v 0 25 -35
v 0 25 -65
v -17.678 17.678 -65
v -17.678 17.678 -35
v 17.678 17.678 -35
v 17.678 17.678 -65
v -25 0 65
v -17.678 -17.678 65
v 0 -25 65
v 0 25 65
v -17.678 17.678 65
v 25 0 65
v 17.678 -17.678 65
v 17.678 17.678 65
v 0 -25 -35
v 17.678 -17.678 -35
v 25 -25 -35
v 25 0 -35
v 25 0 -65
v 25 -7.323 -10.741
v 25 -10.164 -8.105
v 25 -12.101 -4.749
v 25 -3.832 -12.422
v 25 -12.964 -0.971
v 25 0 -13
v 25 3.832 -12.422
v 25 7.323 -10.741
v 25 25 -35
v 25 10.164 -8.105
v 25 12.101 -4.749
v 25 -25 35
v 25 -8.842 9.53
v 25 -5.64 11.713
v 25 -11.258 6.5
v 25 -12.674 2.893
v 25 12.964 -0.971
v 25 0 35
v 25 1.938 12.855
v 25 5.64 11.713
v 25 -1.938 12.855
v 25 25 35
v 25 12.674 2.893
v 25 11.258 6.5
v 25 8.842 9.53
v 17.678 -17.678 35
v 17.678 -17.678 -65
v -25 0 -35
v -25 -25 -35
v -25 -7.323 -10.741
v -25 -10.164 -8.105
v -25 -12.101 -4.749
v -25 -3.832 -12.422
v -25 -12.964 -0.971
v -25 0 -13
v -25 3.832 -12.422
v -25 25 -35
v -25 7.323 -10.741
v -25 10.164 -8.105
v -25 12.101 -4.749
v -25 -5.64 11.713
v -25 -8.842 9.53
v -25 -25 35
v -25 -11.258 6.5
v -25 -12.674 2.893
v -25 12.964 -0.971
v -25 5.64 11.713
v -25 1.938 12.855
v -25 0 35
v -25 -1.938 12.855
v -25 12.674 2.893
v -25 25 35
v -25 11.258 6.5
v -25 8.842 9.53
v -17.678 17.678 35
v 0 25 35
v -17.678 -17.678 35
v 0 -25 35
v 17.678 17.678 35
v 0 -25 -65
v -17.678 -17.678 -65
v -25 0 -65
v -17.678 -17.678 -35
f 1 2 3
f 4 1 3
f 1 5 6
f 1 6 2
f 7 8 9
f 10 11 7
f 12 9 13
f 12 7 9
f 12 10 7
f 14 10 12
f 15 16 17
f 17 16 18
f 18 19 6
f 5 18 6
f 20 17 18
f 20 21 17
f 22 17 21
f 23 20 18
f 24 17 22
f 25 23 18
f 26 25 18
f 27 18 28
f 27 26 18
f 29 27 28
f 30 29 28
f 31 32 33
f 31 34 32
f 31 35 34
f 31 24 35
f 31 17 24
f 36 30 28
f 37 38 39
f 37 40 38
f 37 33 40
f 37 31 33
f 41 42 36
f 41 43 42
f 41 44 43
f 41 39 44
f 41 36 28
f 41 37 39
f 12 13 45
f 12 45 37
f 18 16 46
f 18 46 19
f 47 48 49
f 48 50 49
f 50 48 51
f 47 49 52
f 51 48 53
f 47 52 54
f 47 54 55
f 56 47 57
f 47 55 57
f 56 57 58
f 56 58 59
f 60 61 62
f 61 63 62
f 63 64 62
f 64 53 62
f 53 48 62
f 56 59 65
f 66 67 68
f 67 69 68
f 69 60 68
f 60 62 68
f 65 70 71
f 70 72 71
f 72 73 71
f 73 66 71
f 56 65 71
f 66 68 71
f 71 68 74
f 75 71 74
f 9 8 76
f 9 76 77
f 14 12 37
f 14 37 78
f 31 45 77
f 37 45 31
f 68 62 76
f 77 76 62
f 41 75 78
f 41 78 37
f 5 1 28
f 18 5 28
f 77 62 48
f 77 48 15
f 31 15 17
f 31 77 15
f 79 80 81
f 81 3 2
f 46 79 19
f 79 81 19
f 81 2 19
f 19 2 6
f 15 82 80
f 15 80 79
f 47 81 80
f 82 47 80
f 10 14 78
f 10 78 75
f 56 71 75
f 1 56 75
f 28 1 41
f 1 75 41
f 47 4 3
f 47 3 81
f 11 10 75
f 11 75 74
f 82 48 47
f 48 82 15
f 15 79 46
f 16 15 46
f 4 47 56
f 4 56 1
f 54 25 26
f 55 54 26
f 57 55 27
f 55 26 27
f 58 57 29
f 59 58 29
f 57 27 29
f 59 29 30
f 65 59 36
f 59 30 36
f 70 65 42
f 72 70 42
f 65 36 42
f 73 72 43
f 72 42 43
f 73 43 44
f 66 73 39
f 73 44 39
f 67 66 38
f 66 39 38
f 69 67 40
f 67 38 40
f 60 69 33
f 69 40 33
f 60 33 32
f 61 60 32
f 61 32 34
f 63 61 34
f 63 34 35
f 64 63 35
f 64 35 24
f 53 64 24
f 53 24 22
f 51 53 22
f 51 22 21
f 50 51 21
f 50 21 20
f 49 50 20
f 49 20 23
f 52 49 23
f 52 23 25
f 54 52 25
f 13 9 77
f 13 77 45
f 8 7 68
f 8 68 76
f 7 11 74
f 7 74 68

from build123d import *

# Parameters (mm, degrees)
BOSS_EXTRUDE1_DEPTH = 65
SKETCH1_W           = 50
SKETCH1_H           = 50
BOSS_EXTRUDE2_DEPTH = 35
SKETCH3_R           = 13
CUT_EXTRUDE1_DEPTH  = 70


with BuildPart() as part:
    # Sketch2 → Boss-Extrude1 (new body, symmetric)
    with BuildSketch(Plane.XY):
        Polygon((0, -25), (17.67766953, -17.67766953), (25, 0), (17.67766953, 17.67766953), (0, 25), (-17.67766953, 17.67766953), (-25, 0), (-17.67766953, -17.67766953), align=None)
    extrude(amount=BOSS_EXTRUDE1_DEPTH, both=True)

    # Sketch1 → Boss-Extrude2 (add, symmetric)
    with BuildSketch(Plane.XY):
        Rectangle(SKETCH1_W, SKETCH1_H)
    extrude(amount=BOSS_EXTRUDE2_DEPTH, both=True)

    # Sketch3 → Cut-Extrude1 (cut)
    with BuildSketch(Plane(origin=(25, 0, 0), x_dir=(0, 0, -1), z_dir=(1, 0, 0))):
        Circle(SKETCH3_R)
    extrude(amount=-CUT_EXTRUDE1_DEPTH, mode=Mode.SUBTRACT)


solid = part.part
